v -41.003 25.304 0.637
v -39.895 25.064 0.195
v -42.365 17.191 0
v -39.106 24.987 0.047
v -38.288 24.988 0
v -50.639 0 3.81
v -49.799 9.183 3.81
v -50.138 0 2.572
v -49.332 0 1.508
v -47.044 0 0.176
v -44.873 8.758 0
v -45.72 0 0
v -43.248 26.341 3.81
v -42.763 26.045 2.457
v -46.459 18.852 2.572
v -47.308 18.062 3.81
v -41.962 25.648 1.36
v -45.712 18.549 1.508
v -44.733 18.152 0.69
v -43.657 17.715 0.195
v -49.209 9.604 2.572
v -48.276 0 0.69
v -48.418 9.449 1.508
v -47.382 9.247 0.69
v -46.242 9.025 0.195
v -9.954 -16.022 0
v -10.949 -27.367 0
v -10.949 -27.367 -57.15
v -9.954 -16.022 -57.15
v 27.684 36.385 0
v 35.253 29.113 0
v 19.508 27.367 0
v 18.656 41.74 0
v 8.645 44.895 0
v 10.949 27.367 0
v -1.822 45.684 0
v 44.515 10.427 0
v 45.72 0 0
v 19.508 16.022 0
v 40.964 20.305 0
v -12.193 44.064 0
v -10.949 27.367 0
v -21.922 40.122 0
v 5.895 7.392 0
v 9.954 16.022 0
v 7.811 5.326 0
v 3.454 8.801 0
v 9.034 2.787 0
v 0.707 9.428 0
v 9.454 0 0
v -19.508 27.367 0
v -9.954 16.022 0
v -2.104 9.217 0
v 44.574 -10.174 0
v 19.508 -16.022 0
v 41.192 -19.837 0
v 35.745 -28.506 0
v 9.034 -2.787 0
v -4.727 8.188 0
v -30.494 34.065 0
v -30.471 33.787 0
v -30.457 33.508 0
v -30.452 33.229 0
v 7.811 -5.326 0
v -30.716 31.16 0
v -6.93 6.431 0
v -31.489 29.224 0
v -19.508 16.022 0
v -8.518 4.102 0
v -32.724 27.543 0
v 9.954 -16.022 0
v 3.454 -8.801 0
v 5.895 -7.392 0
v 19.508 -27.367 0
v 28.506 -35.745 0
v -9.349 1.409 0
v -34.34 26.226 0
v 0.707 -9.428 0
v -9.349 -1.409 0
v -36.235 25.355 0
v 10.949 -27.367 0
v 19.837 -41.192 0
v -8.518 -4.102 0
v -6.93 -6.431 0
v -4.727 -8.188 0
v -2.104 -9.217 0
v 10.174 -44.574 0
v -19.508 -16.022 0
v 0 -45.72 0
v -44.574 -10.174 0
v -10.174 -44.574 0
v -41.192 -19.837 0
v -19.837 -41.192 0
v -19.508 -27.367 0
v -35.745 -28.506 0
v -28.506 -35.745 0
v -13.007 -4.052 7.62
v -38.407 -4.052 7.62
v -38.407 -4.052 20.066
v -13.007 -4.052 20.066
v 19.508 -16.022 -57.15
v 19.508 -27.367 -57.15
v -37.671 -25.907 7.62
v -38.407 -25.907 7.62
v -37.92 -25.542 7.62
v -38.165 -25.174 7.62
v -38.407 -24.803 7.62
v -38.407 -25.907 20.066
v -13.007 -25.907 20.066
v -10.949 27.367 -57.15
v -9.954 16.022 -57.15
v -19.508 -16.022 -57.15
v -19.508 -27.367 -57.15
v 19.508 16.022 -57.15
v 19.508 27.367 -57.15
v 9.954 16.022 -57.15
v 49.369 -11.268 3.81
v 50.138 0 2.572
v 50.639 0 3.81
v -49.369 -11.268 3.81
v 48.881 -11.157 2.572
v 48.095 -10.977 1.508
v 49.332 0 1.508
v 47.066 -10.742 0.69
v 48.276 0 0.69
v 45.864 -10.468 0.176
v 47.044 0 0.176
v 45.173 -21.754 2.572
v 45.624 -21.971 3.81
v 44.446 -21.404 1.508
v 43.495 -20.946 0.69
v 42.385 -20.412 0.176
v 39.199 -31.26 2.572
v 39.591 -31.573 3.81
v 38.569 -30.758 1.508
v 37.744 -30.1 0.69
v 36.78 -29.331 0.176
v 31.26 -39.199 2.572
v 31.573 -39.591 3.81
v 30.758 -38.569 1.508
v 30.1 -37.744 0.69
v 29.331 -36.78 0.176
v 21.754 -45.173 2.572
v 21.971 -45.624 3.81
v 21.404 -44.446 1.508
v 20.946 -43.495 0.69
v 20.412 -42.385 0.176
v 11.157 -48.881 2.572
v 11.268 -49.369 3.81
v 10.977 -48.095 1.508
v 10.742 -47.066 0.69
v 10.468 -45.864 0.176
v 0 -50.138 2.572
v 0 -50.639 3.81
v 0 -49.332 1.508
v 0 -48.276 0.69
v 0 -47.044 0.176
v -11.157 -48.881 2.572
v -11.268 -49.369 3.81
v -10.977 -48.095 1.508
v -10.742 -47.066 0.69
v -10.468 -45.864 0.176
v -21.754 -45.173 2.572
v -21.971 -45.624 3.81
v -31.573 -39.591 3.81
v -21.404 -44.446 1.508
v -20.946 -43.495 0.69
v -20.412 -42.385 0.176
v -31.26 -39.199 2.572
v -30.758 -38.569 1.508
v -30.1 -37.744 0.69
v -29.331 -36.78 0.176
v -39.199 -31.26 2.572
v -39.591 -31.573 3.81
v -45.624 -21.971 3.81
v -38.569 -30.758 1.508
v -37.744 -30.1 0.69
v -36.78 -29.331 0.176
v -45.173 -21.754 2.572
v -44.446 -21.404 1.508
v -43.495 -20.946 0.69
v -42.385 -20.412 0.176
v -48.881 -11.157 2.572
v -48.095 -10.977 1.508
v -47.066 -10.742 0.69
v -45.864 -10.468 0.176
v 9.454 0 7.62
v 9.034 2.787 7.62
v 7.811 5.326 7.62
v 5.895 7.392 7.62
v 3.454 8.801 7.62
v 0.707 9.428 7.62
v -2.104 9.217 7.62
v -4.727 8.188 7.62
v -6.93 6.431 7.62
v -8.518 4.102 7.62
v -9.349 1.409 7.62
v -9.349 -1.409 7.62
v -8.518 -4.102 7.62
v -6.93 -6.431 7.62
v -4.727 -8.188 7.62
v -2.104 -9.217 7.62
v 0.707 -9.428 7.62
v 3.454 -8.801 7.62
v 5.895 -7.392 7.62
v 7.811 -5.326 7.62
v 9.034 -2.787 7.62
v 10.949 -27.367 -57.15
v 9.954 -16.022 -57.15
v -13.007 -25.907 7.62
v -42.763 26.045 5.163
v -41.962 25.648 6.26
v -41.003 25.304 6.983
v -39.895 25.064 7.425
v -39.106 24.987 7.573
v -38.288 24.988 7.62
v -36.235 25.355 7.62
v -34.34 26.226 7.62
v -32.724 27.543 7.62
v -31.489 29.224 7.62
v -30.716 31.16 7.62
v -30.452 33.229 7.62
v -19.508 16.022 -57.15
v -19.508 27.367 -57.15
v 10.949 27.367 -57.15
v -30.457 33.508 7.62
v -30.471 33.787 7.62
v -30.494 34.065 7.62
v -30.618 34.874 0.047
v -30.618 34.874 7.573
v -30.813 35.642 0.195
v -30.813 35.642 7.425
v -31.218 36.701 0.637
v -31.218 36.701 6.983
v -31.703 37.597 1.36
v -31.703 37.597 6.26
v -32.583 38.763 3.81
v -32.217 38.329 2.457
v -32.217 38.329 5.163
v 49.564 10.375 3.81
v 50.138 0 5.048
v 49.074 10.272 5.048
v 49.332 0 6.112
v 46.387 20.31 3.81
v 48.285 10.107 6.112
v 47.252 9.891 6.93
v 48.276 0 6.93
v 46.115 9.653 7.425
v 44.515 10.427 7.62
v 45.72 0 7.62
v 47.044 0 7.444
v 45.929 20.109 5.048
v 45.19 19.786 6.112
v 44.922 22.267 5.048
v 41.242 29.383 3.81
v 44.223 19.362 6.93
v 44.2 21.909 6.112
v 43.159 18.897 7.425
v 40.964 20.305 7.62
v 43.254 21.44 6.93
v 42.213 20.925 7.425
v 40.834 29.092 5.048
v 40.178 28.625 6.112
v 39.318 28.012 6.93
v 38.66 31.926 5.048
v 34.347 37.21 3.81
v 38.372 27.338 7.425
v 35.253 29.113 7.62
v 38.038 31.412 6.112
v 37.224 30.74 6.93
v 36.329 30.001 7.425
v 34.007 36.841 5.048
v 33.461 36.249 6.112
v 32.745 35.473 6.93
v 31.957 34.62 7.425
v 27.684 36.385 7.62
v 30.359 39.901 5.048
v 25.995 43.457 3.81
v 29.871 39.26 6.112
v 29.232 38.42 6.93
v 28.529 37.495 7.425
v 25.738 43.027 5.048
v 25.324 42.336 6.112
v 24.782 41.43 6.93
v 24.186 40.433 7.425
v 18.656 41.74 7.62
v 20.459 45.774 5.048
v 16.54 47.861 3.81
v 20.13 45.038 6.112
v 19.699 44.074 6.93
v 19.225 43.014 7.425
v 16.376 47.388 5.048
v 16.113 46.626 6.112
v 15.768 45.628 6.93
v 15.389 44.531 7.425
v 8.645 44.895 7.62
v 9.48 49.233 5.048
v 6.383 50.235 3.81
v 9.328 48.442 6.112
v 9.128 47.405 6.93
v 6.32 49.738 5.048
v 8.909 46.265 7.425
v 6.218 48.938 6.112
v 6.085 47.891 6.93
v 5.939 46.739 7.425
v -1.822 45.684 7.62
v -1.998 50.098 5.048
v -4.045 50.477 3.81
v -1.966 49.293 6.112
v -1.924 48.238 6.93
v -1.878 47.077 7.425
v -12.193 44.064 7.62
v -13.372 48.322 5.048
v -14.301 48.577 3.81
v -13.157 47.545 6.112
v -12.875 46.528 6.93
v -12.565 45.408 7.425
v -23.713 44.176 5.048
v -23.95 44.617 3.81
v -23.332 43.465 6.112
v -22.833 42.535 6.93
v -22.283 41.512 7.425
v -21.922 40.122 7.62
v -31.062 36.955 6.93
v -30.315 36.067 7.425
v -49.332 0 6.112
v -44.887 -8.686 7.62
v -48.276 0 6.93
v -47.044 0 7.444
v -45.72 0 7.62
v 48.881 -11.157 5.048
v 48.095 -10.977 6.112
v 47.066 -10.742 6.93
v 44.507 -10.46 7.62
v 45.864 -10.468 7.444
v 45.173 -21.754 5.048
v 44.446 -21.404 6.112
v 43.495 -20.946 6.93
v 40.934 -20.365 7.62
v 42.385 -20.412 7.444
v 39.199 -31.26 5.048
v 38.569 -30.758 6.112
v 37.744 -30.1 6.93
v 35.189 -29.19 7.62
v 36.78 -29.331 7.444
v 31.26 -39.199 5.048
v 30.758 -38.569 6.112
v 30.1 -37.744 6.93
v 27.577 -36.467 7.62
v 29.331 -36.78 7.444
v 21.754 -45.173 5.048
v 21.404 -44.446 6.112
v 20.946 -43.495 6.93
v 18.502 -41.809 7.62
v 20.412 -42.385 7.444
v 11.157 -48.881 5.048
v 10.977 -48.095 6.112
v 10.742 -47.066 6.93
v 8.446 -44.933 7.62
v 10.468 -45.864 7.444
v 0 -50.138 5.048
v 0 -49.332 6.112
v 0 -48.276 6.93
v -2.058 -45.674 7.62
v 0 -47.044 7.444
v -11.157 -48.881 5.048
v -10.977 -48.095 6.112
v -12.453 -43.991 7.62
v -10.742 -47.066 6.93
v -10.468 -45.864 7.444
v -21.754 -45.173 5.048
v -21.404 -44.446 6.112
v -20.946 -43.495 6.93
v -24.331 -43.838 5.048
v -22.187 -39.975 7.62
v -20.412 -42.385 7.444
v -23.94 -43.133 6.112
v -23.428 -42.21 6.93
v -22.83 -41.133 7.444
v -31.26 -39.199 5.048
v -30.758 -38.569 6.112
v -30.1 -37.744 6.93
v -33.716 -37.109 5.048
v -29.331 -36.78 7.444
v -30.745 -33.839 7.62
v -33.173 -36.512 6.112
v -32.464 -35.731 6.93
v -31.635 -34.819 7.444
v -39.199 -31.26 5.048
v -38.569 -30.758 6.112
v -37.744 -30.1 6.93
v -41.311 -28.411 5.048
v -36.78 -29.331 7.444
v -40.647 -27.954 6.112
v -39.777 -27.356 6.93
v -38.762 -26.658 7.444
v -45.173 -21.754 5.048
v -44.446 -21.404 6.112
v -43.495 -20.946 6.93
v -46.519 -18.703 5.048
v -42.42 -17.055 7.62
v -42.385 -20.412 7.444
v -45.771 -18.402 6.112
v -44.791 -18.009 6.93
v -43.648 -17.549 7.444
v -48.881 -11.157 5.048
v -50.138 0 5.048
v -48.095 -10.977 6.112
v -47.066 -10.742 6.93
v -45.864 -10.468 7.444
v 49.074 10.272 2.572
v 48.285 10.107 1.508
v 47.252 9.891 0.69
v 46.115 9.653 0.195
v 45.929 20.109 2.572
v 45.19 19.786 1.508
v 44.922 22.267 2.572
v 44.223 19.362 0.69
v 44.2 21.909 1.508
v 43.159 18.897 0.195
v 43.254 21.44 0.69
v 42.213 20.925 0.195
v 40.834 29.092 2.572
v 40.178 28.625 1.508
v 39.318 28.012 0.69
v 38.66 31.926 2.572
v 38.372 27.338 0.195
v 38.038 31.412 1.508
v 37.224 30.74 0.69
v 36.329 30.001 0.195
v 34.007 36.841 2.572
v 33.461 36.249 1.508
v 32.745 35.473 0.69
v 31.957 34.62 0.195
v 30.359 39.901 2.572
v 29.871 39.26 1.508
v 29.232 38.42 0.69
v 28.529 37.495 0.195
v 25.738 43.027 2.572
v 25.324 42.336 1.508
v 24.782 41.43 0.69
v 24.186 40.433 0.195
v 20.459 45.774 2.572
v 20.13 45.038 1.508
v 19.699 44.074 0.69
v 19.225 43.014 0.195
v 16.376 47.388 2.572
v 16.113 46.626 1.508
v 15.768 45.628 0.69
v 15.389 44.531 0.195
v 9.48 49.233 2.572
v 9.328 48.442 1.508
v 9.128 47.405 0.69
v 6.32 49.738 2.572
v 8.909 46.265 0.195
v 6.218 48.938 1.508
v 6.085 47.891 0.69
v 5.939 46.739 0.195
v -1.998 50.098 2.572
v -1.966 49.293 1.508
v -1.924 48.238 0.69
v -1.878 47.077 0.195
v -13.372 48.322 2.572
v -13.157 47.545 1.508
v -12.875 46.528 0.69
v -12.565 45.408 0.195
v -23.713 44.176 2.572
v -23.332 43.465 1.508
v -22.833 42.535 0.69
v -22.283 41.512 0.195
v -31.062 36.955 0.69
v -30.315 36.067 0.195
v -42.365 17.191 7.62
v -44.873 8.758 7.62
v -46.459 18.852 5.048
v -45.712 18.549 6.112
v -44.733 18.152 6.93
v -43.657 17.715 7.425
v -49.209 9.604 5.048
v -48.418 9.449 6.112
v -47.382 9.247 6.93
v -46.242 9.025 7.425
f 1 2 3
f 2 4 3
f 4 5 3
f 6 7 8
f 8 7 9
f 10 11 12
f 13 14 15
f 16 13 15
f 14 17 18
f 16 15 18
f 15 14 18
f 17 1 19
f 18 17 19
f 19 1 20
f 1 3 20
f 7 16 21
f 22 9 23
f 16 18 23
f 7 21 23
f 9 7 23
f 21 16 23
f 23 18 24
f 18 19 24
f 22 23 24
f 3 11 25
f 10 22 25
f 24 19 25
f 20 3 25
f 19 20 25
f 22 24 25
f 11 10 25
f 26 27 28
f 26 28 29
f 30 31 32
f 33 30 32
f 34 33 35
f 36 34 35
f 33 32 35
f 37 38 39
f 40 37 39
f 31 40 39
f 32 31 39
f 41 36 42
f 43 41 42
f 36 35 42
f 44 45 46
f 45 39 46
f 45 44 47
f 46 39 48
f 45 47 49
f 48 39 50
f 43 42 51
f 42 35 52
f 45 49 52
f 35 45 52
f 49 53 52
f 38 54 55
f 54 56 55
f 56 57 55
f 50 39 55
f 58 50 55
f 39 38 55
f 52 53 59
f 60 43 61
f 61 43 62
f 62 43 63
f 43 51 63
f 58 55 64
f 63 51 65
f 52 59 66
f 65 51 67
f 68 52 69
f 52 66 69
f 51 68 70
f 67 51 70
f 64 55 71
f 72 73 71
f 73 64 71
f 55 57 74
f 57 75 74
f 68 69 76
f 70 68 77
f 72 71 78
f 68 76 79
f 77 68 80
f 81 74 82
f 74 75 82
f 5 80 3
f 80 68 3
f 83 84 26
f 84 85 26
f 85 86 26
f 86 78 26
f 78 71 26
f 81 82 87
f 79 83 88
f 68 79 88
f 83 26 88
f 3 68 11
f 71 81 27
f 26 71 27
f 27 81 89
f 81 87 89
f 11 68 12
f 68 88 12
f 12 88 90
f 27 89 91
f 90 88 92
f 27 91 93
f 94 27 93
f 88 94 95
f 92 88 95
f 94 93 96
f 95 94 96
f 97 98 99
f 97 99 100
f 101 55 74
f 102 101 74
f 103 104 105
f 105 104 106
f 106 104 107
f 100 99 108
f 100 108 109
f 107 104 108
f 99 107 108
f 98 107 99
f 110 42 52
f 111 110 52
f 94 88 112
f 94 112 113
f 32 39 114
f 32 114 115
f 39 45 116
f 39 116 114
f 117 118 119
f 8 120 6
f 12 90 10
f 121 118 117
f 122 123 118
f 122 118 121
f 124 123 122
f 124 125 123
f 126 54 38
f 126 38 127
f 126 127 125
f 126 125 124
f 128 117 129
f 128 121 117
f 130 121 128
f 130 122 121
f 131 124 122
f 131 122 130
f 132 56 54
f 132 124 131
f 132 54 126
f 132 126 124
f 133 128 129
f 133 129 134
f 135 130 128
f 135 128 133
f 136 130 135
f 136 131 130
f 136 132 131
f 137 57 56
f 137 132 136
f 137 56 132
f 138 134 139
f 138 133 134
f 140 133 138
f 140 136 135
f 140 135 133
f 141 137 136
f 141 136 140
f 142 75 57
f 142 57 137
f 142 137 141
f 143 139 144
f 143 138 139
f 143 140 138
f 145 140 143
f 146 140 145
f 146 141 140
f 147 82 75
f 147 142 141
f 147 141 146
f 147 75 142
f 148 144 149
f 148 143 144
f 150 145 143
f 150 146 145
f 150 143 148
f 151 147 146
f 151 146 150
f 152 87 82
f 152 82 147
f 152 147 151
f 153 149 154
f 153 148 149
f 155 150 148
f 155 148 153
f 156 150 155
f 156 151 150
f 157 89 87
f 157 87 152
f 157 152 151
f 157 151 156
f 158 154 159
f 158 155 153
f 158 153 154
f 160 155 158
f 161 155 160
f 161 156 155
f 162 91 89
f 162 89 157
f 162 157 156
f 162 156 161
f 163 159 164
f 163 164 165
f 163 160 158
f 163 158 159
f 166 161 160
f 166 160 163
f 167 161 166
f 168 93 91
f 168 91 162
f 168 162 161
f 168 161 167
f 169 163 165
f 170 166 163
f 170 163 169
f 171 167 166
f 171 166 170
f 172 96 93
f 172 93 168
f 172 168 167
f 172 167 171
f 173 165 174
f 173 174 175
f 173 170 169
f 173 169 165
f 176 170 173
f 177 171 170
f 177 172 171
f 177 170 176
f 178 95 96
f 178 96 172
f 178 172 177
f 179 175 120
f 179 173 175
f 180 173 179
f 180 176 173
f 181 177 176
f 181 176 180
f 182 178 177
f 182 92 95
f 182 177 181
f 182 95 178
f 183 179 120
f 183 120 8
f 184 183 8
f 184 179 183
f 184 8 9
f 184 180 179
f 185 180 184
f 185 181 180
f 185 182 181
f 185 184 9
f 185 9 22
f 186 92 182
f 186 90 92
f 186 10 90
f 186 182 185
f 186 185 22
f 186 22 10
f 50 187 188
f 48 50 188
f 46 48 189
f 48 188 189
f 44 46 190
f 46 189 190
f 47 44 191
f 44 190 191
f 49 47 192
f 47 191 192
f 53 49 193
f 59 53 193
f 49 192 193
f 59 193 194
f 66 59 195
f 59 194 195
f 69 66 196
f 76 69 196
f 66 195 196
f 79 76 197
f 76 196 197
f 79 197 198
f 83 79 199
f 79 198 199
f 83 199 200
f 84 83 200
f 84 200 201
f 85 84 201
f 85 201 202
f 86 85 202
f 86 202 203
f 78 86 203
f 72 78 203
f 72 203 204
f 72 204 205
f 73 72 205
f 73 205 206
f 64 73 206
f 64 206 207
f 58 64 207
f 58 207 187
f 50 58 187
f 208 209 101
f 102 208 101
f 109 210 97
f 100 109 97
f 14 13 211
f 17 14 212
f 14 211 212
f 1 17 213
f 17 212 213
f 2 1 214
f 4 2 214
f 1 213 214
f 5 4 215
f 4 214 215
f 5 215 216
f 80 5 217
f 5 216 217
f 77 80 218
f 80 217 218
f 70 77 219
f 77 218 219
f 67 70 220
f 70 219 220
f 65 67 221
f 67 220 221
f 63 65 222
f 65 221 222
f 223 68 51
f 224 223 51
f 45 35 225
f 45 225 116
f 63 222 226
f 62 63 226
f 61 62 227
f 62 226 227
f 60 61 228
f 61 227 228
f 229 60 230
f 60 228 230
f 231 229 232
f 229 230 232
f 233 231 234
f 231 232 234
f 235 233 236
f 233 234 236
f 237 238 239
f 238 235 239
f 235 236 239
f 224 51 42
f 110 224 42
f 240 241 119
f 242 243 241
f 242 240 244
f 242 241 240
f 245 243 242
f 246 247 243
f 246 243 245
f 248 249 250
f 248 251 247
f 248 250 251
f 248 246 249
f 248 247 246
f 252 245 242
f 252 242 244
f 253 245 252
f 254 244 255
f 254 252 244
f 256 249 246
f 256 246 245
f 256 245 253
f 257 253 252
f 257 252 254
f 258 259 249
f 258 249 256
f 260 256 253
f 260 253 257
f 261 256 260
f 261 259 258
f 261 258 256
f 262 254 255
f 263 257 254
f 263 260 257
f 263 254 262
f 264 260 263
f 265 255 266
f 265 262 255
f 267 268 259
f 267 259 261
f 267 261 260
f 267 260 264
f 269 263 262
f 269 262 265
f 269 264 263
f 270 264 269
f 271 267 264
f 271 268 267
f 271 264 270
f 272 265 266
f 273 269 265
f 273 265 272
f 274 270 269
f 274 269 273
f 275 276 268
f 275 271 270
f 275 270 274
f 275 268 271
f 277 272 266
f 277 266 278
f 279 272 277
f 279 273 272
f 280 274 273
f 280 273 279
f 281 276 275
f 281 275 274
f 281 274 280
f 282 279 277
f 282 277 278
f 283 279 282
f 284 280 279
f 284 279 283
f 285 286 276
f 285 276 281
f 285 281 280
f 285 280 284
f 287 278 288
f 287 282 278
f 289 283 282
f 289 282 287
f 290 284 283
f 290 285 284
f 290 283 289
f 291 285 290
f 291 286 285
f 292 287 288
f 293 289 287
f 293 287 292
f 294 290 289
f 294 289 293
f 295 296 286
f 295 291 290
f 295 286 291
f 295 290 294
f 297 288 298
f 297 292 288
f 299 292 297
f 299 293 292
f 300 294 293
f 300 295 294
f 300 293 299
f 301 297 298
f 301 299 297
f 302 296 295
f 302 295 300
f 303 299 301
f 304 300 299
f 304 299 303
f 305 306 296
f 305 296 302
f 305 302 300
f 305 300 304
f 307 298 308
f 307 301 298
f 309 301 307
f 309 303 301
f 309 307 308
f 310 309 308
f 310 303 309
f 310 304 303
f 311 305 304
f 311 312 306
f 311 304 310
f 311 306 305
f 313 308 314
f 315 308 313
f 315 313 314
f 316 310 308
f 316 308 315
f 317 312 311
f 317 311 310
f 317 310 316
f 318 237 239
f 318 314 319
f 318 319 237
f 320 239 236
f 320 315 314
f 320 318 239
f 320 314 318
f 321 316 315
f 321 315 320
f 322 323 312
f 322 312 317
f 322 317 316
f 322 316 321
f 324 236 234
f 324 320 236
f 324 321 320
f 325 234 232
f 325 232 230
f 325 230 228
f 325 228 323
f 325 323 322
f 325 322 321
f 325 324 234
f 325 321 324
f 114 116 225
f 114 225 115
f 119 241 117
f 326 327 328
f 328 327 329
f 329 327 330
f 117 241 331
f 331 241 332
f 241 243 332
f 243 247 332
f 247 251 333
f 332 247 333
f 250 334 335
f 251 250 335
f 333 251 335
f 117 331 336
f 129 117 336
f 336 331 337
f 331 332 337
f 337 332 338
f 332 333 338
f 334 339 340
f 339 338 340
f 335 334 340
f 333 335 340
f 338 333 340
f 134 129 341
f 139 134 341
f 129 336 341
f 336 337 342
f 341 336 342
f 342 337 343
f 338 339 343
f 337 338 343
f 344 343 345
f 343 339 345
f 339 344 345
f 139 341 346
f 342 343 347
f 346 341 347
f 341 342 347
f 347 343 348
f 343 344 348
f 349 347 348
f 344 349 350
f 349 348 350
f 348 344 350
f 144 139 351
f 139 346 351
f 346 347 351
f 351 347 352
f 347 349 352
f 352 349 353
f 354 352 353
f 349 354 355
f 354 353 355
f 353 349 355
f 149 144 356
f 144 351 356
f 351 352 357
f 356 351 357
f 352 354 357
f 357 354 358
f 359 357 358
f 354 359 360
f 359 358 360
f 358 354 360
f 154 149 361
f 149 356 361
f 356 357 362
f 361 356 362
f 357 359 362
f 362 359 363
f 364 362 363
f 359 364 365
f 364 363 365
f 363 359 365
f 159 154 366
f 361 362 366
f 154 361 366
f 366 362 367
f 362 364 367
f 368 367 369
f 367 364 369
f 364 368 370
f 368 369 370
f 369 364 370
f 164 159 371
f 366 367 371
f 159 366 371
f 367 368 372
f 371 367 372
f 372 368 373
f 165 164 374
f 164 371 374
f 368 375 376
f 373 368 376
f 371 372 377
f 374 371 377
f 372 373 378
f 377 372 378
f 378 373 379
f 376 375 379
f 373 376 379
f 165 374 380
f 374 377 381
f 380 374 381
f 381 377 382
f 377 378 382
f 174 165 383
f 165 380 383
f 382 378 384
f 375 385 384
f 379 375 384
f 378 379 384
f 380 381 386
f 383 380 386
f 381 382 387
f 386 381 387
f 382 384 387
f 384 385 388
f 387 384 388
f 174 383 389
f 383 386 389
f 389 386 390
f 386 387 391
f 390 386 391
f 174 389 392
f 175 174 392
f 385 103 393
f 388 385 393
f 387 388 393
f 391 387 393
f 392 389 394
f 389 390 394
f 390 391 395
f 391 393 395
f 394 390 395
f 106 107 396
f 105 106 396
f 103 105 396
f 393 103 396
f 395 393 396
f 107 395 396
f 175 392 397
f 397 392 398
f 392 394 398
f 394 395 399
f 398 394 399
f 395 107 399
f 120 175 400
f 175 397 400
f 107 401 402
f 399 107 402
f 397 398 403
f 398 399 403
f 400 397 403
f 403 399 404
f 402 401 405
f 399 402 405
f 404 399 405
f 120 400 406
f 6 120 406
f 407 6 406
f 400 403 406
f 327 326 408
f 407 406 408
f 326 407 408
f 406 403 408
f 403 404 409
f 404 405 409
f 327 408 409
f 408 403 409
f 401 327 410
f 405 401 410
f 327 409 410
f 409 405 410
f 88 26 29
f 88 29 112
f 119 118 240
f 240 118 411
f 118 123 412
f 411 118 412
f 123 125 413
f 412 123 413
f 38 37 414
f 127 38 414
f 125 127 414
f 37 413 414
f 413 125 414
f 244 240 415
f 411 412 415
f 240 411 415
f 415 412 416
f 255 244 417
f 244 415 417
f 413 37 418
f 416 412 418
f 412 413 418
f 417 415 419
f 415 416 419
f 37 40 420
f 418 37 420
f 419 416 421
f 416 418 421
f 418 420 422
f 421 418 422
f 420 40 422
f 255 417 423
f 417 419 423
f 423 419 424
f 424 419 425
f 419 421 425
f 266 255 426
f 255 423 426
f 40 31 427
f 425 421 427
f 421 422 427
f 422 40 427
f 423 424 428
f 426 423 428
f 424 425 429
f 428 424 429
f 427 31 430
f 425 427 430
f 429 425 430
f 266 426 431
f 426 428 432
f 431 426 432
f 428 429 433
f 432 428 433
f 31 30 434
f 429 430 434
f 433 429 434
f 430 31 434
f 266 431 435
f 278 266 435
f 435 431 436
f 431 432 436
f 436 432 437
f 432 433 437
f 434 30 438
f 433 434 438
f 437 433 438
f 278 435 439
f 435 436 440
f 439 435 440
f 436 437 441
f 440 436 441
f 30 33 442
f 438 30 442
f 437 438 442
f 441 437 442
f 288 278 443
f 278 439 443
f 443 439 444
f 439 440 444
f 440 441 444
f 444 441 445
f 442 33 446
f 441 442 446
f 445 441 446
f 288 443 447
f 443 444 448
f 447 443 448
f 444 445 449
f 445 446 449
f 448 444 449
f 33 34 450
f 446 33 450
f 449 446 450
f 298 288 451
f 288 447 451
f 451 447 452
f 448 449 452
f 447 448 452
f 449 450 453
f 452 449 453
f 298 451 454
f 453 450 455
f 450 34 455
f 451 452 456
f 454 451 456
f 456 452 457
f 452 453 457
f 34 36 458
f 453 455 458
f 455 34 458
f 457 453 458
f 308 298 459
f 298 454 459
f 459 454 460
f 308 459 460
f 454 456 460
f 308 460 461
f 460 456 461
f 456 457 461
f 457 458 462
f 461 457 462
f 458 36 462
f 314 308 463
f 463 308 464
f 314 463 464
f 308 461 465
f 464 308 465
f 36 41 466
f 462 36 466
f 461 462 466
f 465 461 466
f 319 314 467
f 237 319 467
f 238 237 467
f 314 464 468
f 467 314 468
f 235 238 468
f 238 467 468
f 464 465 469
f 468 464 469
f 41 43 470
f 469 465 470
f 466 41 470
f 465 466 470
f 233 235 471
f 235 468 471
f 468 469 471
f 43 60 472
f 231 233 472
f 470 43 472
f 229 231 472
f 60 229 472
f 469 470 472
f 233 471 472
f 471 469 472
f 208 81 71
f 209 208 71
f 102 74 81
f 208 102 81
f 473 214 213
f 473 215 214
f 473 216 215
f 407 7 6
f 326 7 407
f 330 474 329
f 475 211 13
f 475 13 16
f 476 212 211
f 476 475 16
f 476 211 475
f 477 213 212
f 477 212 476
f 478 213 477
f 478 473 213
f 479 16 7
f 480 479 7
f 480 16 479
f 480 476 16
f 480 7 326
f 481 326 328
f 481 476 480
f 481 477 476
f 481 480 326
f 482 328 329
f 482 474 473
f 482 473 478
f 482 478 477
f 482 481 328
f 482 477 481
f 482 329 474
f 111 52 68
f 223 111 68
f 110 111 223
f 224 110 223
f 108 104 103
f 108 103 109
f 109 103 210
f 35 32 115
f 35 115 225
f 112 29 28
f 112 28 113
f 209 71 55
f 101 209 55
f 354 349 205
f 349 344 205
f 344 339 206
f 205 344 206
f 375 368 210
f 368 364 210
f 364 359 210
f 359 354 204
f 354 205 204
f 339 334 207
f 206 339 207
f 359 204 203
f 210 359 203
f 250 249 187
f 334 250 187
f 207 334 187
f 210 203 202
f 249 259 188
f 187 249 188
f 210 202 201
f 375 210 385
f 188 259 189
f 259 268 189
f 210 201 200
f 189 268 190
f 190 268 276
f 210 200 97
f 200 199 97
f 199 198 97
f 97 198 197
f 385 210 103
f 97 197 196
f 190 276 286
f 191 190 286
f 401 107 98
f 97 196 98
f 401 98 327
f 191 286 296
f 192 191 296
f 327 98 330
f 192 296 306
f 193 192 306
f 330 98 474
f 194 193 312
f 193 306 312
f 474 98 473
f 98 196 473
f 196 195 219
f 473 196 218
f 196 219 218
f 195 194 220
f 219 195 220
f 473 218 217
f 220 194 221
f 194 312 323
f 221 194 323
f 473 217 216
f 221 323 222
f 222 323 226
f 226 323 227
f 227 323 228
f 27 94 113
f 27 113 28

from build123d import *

# Parameters (mm, degrees)
F1_DEPTH    = 7.62
F3_DEPTH    = 57.15
F4_T2_ANGLE = 118.6593978475
F4_T4_ANGLE = 118.6593978475
F7_R        = 8.2517563721
F8_DEPTH    = 25.4
F9_R        = 9.4542856314
F10_DEPTH   = 26.162
F11_W       = 25.4
F11_H       = 21.8551358064
F12_DEPTH   = 12.446


# Not quite as in the source:
# - a fillet or chamfer that OpenCascade refuses, or shapes differently, is made with other operations: its cross-section is extruded or revolved along the edge and cut away or added


with BuildPart() as f1:
    # F0 (on Top) → F1 (new body)
    with BuildSketch(Plane.XY):
        with BuildLine():
            ThreePointArc((0, -50.8), (35.9210244843, -35.9210244843), (50.8, 0))
            Line((50.8, 0), (0, 0))
            Line((0, 0), (0, -50.8))
        make_face()
    extrude(amount=F1_DEPTH)

    # F2 (on face) → F3 (join)
    with BuildSketch(Plane(origin=(0, 0, 0), x_dir=(1, 0, 0), z_dir=(0, 0, -1))):
        Polygon((19.5075478405, 27.366604656), (10.9492652118, 27.366604656), (9.9541153759, 16.0219036043), (19.5075478405, 16.0219036043), align=None)
    extrude(amount=F3_DEPTH)

    # F4: fillet of radius 5.08 on 2 edges, made by hand

    # F4_s1 → F4_t2 (revolve, cut)
    with BuildSketch(Plane(origin=(0, 0, 0), x_dir=(0, 0, 1), z_dir=(-0.9688875708, 0.247501263, 0))):
        with BuildLine():
            ThreePointArc((2.54, -50.8), (6.1321024484, -49.3121024484), (7.62, -45.72))
            Line((7.62, -45.72), (7.62, -50.8))
            Line((7.62, -50.8), (2.54, -50.8))
        make_face()
    revolve(axis=Axis((0, 0, 7.62), (0, 0, 1)), revolution_arc=F4_T2_ANGLE, mode=Mode.SUBTRACT)

    # F4_s3 → F4_t4 (revolve, cut)
    with BuildSketch(Plane(origin=(0, 0, 0), x_dir=(0, 0, 1), z_dir=(-0.9688875708, 0.247501263, 0))):
        with BuildLine():
            ThreePointArc((5.08, -50.8), (1.4878975516, -49.3121024484), (0, -45.72))
            Line((0, -45.72), (0, -50.8))
            Line((0, -50.8), (5.08, -50.8))
        make_face()
    revolve(axis=Axis((0, 0, 0), (0, 0, 1)), revolution_arc=F4_T4_ANGLE, mode=Mode.SUBTRACT)

    # F5: F1 across plane


with BuildPart() as f1_1:
    add(f1.part)
    add(f1.part.mirror(Plane.YZ))

    # F6: F1 across plane


with BuildPart() as f1_2:
    add(f1_1.part)
    add(f1_1.part.mirror(Plane.XZ))

    # F7 (on face) → F8 (cut)
    with BuildSketch(Plane.XY.offset(7.62)):
        with Locations((-38.7037992477, 33.2289077342)):
            Circle(F7_R)
    extrude(amount=-F8_DEPTH, mode=Mode.SUBTRACT)

    # F9 (on face) → F10 (cut)
    with BuildSketch(Plane.XY.offset(7.62)):
        Circle(F9_R)
    extrude(amount=-F10_DEPTH, mode=Mode.SUBTRACT)

    # F11 (on face) → F12 (join)
    with BuildSketch(Plane.XY.offset(7.62)):
        with Locations((-25.7072858512, -14.9798975326)):
            Rectangle(F11_W, F11_H)
    extrude(amount=F12_DEPTH)


solid = f1_2.part
